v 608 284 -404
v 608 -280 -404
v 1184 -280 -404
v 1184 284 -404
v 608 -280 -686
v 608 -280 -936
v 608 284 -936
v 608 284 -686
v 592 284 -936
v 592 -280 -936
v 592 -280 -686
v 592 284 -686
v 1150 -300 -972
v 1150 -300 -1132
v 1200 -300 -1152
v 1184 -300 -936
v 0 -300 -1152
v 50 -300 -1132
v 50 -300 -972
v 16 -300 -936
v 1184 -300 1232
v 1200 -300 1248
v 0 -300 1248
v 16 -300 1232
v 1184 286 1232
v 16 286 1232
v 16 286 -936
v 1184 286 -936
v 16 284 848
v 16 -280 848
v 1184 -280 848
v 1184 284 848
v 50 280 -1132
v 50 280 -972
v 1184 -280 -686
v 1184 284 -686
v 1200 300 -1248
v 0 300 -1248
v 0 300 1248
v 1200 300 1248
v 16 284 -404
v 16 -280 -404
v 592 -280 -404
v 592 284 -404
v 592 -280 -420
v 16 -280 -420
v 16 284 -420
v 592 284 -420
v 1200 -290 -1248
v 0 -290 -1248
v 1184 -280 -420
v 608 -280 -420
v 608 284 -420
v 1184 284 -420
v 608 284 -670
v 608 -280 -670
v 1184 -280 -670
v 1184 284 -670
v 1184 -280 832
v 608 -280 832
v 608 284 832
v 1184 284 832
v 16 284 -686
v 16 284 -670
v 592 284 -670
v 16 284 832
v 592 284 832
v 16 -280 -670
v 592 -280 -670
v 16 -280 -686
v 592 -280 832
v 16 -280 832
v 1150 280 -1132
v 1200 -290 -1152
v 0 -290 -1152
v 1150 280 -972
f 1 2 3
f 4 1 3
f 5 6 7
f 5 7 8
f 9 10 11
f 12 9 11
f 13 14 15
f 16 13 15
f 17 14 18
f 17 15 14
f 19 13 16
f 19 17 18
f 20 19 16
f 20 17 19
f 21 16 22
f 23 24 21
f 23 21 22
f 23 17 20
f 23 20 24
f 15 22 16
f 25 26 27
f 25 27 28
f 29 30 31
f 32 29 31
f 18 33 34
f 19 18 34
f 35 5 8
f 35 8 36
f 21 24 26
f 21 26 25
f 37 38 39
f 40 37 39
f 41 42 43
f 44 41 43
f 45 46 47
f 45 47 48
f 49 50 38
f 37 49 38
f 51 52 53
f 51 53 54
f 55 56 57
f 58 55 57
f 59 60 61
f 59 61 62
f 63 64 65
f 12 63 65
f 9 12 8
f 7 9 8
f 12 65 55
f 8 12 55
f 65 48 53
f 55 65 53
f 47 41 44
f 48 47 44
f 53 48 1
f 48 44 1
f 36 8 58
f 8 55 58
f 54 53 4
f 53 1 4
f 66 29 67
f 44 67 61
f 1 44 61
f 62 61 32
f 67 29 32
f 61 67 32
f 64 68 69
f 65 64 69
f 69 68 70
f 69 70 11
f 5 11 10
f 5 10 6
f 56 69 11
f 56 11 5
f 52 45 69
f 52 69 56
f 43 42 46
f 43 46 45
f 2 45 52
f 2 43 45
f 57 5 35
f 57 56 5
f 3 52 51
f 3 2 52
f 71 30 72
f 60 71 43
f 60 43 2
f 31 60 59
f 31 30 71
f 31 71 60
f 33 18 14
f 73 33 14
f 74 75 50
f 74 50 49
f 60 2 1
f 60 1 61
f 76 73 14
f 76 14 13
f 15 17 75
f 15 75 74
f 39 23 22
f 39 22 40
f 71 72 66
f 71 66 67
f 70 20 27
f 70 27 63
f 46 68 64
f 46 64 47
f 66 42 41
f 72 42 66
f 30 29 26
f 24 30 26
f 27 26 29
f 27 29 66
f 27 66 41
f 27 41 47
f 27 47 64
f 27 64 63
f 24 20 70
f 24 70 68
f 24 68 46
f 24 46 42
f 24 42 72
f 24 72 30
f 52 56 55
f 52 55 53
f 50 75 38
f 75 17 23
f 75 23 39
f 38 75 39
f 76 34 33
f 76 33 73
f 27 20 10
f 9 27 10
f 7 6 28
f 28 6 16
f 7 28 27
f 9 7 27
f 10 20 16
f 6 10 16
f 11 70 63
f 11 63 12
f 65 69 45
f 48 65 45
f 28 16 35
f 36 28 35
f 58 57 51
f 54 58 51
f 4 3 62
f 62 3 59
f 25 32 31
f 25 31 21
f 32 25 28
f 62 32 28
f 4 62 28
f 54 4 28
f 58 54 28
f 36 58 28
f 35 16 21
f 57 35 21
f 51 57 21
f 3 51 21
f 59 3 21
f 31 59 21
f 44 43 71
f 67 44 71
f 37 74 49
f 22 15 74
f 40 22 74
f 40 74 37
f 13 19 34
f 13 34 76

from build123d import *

# Parameters (mm, degrees)
F0_W      = 600
F0_H      = 2496
F1_DEPTH  = 1200
F2_W      = 1200
F2_H      = 96
F3_DEPTH  = 10
F4_W      = 1100
F4_H      = 160
F5_DEPTH  = 580
F7_W      = 1168
F7_H      = 2168
F8_DEPTH  = 586
F9_W      = 1168
F9_H      = 16
F10_DEPTH = 564
F11_W     = 16
F11_H     = 1768
F12_DEPTH = 564
F13_W     = 1168
F13_H     = 16
F14_DEPTH = 564


with BuildPart() as f1:
    # F0 (on Right) → F1 (new body)
    with BuildSketch(Plane.YZ):
        Rectangle(F0_W, F0_H)
    extrude(amount=F1_DEPTH)

    # F2 (on face) → F3 (cut)
    with BuildSketch(Plane.XZ.offset(300)):
        with Locations((600, -1200)):
            Rectangle(F2_W, F2_H)
    extrude(amount=-F3_DEPTH, mode=Mode.SUBTRACT)

    # F4 (on face) → F5 (cut)
    with BuildSketch(Plane.XZ.offset(300)):
        with Locations((600, -1052)):
            Rectangle(F4_W, F4_H)
    extrude(amount=-F5_DEPTH, mode=Mode.SUBTRACT)

    # F7 (on face) → F8 (cut)
    with BuildSketch(Plane.XZ.offset(300)):
        with Locations((600, 148)):
            Rectangle(F7_W, F7_H)
    extrude(amount=-F8_DEPTH, mode=Mode.SUBTRACT)

    # F9 (on offset) → F10 (join)
    with BuildSketch(Plane.XZ.offset(280)):
        with Locations((600, 840)):
            Rectangle(F9_W, F9_H)
    extrude(amount=-F10_DEPTH)

    # F11 (on offset) → F12 (join)
    with BuildSketch(Plane.XZ.offset(280)):
        with Locations((600, -52)):
            Rectangle(F11_W, F11_H)
    extrude(amount=-F12_DEPTH)

    # F13 (on offset) → F14 (join)
    with BuildSketch(Plane.XZ.offset(280)):
        with Locations((600, -678)):
            Rectangle(F13_W, F13_H)
        with Locations((600, -412)):
            Rectangle(F13_W, F13_H)
    extrude(amount=-F14_DEPTH)


solid = f1.part
